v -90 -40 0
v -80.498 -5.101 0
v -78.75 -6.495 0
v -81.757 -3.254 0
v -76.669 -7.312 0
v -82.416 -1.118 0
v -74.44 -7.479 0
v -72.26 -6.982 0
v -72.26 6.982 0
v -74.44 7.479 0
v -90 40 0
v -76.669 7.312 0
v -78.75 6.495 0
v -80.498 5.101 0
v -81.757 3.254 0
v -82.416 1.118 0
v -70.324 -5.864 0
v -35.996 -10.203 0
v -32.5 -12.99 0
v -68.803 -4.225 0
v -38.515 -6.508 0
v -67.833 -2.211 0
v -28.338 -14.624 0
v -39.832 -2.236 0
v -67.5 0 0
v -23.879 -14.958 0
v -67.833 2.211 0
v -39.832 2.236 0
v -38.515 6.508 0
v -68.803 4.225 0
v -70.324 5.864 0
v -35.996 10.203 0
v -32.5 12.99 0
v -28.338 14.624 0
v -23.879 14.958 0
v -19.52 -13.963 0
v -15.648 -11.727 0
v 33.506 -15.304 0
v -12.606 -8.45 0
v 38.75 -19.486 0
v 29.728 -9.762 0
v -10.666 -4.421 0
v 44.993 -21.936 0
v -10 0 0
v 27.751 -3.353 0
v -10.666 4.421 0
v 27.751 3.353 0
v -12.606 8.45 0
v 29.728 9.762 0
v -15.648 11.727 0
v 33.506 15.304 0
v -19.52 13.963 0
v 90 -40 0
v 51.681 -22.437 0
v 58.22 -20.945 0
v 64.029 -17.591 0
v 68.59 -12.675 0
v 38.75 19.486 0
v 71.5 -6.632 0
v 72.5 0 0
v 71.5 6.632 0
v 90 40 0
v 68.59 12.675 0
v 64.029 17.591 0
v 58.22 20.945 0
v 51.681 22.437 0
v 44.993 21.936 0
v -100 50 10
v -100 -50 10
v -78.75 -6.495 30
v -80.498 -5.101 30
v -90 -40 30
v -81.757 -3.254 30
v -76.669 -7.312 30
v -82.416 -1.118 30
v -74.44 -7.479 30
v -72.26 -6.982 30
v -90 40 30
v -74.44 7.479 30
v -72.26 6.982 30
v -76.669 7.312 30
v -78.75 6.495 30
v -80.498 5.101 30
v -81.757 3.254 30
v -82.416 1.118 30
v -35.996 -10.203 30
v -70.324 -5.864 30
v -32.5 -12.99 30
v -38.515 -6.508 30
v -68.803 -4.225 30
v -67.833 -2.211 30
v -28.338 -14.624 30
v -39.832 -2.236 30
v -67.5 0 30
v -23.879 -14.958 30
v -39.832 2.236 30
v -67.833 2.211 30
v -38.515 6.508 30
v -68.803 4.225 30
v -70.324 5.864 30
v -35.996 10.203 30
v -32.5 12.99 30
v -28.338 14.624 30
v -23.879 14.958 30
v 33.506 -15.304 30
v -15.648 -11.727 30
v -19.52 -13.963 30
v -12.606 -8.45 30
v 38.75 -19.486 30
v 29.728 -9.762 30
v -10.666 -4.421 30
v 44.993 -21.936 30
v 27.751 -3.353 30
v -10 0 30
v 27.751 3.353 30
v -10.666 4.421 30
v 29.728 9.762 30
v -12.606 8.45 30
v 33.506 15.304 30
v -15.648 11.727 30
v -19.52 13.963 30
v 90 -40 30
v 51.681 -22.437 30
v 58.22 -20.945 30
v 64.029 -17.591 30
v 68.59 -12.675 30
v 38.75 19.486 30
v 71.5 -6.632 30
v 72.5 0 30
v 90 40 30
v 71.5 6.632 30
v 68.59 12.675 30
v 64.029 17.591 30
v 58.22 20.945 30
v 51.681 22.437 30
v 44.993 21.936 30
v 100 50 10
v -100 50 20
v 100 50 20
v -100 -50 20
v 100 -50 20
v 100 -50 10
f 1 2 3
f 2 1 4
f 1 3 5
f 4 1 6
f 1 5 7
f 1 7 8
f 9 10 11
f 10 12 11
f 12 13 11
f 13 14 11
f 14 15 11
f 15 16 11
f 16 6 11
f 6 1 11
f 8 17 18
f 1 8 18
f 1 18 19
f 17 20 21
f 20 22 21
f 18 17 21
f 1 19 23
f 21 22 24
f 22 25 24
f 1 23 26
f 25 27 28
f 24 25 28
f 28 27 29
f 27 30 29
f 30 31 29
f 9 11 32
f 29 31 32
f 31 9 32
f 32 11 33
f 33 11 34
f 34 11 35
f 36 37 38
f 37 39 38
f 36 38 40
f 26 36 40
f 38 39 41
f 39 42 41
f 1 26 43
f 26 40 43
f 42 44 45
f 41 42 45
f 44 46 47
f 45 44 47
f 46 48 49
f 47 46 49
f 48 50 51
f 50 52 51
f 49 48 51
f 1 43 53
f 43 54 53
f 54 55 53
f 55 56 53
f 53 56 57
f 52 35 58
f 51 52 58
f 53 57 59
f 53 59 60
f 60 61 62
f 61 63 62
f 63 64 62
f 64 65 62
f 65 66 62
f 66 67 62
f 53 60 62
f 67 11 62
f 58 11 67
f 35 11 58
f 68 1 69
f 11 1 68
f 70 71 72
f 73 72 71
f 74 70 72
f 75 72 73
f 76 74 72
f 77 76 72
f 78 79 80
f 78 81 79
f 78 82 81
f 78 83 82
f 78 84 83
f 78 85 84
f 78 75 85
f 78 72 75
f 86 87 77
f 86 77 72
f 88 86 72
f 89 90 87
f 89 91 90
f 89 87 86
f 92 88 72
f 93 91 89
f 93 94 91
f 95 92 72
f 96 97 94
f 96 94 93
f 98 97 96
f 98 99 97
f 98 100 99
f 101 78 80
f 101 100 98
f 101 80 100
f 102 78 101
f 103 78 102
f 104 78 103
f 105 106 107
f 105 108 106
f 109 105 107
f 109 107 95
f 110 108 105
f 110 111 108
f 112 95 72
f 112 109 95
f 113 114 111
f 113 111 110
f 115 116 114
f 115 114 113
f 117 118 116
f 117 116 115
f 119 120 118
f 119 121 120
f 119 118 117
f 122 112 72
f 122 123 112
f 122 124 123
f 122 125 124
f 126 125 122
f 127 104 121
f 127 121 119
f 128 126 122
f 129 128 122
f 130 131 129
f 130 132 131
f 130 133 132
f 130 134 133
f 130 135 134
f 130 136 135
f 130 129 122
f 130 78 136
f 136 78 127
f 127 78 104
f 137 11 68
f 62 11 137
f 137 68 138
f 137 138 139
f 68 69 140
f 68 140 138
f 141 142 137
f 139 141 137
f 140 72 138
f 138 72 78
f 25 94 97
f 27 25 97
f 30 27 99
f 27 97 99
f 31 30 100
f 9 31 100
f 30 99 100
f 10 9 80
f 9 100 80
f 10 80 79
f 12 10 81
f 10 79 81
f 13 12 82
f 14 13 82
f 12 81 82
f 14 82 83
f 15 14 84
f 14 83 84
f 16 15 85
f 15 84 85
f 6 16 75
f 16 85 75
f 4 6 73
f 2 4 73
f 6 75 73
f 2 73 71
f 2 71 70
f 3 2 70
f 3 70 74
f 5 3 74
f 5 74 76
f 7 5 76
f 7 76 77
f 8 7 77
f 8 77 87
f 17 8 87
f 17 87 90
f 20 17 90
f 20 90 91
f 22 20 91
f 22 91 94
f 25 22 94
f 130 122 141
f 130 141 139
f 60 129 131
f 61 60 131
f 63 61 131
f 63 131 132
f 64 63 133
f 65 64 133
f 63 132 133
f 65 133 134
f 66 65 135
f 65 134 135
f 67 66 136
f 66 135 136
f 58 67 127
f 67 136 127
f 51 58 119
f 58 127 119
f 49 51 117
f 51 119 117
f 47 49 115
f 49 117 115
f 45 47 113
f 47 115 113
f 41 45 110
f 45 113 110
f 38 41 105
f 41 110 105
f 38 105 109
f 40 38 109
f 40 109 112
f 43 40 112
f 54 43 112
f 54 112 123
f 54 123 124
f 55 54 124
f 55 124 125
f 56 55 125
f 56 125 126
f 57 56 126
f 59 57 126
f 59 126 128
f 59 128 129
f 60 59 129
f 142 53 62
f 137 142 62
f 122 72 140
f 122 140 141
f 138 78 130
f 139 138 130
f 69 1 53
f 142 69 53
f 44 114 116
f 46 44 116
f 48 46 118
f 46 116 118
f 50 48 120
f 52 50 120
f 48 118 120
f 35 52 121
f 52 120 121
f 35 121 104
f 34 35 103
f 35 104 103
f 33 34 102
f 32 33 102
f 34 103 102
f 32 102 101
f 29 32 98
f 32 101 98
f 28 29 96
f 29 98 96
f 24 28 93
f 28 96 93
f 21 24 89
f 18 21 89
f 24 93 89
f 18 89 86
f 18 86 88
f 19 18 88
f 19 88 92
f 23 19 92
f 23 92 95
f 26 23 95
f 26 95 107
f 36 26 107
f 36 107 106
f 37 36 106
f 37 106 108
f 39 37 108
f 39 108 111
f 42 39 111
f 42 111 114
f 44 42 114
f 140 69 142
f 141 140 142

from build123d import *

# Parameters (mm, degrees)
F0_W     = 200
F0_H     = 100
F1_DEPTH = 30
F3_SIZE2 = 10
F3_SIZE  = 10
F2_R     = 7.5
F2_R_2   = 15
F2_R_3   = 22.5
F4_DEPTH = 30.001


with BuildPart() as f1:
    # F0 (on Top) → F1 (new body)
    with BuildSketch(Plane.XY):
        Rectangle(F0_W, F0_H)
    extrude(amount=F1_DEPTH)

    # F3
    f3_edges = [f1.edges().sort_by_distance(p)[0] for p in [
        (0, -50, 30),
        (100, 0, 30),
        (0, 50, 30),
        (-100, 0, 30),
        (0, -50, 0),
        (100, 0, 0),
        (-100, 0, 0),
        (0, 50, 0),
    ]]
    chamfer(f3_edges, length=F3_SIZE, length2=F3_SIZE2)

    # F2 (on face) → F4 (cut, through all)
    with BuildSketch(Plane.XY.offset(30)):
        with Locations((-75, 0)):
            Circle(F2_R)
        with Locations((-25, 0)):
            Circle(F2_R_2)
        with Locations((50, 0)):
            Circle(F2_R_3)
    extrude(amount=-F4_DEPTH, mode=Mode.SUBTRACT)


solid = f1.part
